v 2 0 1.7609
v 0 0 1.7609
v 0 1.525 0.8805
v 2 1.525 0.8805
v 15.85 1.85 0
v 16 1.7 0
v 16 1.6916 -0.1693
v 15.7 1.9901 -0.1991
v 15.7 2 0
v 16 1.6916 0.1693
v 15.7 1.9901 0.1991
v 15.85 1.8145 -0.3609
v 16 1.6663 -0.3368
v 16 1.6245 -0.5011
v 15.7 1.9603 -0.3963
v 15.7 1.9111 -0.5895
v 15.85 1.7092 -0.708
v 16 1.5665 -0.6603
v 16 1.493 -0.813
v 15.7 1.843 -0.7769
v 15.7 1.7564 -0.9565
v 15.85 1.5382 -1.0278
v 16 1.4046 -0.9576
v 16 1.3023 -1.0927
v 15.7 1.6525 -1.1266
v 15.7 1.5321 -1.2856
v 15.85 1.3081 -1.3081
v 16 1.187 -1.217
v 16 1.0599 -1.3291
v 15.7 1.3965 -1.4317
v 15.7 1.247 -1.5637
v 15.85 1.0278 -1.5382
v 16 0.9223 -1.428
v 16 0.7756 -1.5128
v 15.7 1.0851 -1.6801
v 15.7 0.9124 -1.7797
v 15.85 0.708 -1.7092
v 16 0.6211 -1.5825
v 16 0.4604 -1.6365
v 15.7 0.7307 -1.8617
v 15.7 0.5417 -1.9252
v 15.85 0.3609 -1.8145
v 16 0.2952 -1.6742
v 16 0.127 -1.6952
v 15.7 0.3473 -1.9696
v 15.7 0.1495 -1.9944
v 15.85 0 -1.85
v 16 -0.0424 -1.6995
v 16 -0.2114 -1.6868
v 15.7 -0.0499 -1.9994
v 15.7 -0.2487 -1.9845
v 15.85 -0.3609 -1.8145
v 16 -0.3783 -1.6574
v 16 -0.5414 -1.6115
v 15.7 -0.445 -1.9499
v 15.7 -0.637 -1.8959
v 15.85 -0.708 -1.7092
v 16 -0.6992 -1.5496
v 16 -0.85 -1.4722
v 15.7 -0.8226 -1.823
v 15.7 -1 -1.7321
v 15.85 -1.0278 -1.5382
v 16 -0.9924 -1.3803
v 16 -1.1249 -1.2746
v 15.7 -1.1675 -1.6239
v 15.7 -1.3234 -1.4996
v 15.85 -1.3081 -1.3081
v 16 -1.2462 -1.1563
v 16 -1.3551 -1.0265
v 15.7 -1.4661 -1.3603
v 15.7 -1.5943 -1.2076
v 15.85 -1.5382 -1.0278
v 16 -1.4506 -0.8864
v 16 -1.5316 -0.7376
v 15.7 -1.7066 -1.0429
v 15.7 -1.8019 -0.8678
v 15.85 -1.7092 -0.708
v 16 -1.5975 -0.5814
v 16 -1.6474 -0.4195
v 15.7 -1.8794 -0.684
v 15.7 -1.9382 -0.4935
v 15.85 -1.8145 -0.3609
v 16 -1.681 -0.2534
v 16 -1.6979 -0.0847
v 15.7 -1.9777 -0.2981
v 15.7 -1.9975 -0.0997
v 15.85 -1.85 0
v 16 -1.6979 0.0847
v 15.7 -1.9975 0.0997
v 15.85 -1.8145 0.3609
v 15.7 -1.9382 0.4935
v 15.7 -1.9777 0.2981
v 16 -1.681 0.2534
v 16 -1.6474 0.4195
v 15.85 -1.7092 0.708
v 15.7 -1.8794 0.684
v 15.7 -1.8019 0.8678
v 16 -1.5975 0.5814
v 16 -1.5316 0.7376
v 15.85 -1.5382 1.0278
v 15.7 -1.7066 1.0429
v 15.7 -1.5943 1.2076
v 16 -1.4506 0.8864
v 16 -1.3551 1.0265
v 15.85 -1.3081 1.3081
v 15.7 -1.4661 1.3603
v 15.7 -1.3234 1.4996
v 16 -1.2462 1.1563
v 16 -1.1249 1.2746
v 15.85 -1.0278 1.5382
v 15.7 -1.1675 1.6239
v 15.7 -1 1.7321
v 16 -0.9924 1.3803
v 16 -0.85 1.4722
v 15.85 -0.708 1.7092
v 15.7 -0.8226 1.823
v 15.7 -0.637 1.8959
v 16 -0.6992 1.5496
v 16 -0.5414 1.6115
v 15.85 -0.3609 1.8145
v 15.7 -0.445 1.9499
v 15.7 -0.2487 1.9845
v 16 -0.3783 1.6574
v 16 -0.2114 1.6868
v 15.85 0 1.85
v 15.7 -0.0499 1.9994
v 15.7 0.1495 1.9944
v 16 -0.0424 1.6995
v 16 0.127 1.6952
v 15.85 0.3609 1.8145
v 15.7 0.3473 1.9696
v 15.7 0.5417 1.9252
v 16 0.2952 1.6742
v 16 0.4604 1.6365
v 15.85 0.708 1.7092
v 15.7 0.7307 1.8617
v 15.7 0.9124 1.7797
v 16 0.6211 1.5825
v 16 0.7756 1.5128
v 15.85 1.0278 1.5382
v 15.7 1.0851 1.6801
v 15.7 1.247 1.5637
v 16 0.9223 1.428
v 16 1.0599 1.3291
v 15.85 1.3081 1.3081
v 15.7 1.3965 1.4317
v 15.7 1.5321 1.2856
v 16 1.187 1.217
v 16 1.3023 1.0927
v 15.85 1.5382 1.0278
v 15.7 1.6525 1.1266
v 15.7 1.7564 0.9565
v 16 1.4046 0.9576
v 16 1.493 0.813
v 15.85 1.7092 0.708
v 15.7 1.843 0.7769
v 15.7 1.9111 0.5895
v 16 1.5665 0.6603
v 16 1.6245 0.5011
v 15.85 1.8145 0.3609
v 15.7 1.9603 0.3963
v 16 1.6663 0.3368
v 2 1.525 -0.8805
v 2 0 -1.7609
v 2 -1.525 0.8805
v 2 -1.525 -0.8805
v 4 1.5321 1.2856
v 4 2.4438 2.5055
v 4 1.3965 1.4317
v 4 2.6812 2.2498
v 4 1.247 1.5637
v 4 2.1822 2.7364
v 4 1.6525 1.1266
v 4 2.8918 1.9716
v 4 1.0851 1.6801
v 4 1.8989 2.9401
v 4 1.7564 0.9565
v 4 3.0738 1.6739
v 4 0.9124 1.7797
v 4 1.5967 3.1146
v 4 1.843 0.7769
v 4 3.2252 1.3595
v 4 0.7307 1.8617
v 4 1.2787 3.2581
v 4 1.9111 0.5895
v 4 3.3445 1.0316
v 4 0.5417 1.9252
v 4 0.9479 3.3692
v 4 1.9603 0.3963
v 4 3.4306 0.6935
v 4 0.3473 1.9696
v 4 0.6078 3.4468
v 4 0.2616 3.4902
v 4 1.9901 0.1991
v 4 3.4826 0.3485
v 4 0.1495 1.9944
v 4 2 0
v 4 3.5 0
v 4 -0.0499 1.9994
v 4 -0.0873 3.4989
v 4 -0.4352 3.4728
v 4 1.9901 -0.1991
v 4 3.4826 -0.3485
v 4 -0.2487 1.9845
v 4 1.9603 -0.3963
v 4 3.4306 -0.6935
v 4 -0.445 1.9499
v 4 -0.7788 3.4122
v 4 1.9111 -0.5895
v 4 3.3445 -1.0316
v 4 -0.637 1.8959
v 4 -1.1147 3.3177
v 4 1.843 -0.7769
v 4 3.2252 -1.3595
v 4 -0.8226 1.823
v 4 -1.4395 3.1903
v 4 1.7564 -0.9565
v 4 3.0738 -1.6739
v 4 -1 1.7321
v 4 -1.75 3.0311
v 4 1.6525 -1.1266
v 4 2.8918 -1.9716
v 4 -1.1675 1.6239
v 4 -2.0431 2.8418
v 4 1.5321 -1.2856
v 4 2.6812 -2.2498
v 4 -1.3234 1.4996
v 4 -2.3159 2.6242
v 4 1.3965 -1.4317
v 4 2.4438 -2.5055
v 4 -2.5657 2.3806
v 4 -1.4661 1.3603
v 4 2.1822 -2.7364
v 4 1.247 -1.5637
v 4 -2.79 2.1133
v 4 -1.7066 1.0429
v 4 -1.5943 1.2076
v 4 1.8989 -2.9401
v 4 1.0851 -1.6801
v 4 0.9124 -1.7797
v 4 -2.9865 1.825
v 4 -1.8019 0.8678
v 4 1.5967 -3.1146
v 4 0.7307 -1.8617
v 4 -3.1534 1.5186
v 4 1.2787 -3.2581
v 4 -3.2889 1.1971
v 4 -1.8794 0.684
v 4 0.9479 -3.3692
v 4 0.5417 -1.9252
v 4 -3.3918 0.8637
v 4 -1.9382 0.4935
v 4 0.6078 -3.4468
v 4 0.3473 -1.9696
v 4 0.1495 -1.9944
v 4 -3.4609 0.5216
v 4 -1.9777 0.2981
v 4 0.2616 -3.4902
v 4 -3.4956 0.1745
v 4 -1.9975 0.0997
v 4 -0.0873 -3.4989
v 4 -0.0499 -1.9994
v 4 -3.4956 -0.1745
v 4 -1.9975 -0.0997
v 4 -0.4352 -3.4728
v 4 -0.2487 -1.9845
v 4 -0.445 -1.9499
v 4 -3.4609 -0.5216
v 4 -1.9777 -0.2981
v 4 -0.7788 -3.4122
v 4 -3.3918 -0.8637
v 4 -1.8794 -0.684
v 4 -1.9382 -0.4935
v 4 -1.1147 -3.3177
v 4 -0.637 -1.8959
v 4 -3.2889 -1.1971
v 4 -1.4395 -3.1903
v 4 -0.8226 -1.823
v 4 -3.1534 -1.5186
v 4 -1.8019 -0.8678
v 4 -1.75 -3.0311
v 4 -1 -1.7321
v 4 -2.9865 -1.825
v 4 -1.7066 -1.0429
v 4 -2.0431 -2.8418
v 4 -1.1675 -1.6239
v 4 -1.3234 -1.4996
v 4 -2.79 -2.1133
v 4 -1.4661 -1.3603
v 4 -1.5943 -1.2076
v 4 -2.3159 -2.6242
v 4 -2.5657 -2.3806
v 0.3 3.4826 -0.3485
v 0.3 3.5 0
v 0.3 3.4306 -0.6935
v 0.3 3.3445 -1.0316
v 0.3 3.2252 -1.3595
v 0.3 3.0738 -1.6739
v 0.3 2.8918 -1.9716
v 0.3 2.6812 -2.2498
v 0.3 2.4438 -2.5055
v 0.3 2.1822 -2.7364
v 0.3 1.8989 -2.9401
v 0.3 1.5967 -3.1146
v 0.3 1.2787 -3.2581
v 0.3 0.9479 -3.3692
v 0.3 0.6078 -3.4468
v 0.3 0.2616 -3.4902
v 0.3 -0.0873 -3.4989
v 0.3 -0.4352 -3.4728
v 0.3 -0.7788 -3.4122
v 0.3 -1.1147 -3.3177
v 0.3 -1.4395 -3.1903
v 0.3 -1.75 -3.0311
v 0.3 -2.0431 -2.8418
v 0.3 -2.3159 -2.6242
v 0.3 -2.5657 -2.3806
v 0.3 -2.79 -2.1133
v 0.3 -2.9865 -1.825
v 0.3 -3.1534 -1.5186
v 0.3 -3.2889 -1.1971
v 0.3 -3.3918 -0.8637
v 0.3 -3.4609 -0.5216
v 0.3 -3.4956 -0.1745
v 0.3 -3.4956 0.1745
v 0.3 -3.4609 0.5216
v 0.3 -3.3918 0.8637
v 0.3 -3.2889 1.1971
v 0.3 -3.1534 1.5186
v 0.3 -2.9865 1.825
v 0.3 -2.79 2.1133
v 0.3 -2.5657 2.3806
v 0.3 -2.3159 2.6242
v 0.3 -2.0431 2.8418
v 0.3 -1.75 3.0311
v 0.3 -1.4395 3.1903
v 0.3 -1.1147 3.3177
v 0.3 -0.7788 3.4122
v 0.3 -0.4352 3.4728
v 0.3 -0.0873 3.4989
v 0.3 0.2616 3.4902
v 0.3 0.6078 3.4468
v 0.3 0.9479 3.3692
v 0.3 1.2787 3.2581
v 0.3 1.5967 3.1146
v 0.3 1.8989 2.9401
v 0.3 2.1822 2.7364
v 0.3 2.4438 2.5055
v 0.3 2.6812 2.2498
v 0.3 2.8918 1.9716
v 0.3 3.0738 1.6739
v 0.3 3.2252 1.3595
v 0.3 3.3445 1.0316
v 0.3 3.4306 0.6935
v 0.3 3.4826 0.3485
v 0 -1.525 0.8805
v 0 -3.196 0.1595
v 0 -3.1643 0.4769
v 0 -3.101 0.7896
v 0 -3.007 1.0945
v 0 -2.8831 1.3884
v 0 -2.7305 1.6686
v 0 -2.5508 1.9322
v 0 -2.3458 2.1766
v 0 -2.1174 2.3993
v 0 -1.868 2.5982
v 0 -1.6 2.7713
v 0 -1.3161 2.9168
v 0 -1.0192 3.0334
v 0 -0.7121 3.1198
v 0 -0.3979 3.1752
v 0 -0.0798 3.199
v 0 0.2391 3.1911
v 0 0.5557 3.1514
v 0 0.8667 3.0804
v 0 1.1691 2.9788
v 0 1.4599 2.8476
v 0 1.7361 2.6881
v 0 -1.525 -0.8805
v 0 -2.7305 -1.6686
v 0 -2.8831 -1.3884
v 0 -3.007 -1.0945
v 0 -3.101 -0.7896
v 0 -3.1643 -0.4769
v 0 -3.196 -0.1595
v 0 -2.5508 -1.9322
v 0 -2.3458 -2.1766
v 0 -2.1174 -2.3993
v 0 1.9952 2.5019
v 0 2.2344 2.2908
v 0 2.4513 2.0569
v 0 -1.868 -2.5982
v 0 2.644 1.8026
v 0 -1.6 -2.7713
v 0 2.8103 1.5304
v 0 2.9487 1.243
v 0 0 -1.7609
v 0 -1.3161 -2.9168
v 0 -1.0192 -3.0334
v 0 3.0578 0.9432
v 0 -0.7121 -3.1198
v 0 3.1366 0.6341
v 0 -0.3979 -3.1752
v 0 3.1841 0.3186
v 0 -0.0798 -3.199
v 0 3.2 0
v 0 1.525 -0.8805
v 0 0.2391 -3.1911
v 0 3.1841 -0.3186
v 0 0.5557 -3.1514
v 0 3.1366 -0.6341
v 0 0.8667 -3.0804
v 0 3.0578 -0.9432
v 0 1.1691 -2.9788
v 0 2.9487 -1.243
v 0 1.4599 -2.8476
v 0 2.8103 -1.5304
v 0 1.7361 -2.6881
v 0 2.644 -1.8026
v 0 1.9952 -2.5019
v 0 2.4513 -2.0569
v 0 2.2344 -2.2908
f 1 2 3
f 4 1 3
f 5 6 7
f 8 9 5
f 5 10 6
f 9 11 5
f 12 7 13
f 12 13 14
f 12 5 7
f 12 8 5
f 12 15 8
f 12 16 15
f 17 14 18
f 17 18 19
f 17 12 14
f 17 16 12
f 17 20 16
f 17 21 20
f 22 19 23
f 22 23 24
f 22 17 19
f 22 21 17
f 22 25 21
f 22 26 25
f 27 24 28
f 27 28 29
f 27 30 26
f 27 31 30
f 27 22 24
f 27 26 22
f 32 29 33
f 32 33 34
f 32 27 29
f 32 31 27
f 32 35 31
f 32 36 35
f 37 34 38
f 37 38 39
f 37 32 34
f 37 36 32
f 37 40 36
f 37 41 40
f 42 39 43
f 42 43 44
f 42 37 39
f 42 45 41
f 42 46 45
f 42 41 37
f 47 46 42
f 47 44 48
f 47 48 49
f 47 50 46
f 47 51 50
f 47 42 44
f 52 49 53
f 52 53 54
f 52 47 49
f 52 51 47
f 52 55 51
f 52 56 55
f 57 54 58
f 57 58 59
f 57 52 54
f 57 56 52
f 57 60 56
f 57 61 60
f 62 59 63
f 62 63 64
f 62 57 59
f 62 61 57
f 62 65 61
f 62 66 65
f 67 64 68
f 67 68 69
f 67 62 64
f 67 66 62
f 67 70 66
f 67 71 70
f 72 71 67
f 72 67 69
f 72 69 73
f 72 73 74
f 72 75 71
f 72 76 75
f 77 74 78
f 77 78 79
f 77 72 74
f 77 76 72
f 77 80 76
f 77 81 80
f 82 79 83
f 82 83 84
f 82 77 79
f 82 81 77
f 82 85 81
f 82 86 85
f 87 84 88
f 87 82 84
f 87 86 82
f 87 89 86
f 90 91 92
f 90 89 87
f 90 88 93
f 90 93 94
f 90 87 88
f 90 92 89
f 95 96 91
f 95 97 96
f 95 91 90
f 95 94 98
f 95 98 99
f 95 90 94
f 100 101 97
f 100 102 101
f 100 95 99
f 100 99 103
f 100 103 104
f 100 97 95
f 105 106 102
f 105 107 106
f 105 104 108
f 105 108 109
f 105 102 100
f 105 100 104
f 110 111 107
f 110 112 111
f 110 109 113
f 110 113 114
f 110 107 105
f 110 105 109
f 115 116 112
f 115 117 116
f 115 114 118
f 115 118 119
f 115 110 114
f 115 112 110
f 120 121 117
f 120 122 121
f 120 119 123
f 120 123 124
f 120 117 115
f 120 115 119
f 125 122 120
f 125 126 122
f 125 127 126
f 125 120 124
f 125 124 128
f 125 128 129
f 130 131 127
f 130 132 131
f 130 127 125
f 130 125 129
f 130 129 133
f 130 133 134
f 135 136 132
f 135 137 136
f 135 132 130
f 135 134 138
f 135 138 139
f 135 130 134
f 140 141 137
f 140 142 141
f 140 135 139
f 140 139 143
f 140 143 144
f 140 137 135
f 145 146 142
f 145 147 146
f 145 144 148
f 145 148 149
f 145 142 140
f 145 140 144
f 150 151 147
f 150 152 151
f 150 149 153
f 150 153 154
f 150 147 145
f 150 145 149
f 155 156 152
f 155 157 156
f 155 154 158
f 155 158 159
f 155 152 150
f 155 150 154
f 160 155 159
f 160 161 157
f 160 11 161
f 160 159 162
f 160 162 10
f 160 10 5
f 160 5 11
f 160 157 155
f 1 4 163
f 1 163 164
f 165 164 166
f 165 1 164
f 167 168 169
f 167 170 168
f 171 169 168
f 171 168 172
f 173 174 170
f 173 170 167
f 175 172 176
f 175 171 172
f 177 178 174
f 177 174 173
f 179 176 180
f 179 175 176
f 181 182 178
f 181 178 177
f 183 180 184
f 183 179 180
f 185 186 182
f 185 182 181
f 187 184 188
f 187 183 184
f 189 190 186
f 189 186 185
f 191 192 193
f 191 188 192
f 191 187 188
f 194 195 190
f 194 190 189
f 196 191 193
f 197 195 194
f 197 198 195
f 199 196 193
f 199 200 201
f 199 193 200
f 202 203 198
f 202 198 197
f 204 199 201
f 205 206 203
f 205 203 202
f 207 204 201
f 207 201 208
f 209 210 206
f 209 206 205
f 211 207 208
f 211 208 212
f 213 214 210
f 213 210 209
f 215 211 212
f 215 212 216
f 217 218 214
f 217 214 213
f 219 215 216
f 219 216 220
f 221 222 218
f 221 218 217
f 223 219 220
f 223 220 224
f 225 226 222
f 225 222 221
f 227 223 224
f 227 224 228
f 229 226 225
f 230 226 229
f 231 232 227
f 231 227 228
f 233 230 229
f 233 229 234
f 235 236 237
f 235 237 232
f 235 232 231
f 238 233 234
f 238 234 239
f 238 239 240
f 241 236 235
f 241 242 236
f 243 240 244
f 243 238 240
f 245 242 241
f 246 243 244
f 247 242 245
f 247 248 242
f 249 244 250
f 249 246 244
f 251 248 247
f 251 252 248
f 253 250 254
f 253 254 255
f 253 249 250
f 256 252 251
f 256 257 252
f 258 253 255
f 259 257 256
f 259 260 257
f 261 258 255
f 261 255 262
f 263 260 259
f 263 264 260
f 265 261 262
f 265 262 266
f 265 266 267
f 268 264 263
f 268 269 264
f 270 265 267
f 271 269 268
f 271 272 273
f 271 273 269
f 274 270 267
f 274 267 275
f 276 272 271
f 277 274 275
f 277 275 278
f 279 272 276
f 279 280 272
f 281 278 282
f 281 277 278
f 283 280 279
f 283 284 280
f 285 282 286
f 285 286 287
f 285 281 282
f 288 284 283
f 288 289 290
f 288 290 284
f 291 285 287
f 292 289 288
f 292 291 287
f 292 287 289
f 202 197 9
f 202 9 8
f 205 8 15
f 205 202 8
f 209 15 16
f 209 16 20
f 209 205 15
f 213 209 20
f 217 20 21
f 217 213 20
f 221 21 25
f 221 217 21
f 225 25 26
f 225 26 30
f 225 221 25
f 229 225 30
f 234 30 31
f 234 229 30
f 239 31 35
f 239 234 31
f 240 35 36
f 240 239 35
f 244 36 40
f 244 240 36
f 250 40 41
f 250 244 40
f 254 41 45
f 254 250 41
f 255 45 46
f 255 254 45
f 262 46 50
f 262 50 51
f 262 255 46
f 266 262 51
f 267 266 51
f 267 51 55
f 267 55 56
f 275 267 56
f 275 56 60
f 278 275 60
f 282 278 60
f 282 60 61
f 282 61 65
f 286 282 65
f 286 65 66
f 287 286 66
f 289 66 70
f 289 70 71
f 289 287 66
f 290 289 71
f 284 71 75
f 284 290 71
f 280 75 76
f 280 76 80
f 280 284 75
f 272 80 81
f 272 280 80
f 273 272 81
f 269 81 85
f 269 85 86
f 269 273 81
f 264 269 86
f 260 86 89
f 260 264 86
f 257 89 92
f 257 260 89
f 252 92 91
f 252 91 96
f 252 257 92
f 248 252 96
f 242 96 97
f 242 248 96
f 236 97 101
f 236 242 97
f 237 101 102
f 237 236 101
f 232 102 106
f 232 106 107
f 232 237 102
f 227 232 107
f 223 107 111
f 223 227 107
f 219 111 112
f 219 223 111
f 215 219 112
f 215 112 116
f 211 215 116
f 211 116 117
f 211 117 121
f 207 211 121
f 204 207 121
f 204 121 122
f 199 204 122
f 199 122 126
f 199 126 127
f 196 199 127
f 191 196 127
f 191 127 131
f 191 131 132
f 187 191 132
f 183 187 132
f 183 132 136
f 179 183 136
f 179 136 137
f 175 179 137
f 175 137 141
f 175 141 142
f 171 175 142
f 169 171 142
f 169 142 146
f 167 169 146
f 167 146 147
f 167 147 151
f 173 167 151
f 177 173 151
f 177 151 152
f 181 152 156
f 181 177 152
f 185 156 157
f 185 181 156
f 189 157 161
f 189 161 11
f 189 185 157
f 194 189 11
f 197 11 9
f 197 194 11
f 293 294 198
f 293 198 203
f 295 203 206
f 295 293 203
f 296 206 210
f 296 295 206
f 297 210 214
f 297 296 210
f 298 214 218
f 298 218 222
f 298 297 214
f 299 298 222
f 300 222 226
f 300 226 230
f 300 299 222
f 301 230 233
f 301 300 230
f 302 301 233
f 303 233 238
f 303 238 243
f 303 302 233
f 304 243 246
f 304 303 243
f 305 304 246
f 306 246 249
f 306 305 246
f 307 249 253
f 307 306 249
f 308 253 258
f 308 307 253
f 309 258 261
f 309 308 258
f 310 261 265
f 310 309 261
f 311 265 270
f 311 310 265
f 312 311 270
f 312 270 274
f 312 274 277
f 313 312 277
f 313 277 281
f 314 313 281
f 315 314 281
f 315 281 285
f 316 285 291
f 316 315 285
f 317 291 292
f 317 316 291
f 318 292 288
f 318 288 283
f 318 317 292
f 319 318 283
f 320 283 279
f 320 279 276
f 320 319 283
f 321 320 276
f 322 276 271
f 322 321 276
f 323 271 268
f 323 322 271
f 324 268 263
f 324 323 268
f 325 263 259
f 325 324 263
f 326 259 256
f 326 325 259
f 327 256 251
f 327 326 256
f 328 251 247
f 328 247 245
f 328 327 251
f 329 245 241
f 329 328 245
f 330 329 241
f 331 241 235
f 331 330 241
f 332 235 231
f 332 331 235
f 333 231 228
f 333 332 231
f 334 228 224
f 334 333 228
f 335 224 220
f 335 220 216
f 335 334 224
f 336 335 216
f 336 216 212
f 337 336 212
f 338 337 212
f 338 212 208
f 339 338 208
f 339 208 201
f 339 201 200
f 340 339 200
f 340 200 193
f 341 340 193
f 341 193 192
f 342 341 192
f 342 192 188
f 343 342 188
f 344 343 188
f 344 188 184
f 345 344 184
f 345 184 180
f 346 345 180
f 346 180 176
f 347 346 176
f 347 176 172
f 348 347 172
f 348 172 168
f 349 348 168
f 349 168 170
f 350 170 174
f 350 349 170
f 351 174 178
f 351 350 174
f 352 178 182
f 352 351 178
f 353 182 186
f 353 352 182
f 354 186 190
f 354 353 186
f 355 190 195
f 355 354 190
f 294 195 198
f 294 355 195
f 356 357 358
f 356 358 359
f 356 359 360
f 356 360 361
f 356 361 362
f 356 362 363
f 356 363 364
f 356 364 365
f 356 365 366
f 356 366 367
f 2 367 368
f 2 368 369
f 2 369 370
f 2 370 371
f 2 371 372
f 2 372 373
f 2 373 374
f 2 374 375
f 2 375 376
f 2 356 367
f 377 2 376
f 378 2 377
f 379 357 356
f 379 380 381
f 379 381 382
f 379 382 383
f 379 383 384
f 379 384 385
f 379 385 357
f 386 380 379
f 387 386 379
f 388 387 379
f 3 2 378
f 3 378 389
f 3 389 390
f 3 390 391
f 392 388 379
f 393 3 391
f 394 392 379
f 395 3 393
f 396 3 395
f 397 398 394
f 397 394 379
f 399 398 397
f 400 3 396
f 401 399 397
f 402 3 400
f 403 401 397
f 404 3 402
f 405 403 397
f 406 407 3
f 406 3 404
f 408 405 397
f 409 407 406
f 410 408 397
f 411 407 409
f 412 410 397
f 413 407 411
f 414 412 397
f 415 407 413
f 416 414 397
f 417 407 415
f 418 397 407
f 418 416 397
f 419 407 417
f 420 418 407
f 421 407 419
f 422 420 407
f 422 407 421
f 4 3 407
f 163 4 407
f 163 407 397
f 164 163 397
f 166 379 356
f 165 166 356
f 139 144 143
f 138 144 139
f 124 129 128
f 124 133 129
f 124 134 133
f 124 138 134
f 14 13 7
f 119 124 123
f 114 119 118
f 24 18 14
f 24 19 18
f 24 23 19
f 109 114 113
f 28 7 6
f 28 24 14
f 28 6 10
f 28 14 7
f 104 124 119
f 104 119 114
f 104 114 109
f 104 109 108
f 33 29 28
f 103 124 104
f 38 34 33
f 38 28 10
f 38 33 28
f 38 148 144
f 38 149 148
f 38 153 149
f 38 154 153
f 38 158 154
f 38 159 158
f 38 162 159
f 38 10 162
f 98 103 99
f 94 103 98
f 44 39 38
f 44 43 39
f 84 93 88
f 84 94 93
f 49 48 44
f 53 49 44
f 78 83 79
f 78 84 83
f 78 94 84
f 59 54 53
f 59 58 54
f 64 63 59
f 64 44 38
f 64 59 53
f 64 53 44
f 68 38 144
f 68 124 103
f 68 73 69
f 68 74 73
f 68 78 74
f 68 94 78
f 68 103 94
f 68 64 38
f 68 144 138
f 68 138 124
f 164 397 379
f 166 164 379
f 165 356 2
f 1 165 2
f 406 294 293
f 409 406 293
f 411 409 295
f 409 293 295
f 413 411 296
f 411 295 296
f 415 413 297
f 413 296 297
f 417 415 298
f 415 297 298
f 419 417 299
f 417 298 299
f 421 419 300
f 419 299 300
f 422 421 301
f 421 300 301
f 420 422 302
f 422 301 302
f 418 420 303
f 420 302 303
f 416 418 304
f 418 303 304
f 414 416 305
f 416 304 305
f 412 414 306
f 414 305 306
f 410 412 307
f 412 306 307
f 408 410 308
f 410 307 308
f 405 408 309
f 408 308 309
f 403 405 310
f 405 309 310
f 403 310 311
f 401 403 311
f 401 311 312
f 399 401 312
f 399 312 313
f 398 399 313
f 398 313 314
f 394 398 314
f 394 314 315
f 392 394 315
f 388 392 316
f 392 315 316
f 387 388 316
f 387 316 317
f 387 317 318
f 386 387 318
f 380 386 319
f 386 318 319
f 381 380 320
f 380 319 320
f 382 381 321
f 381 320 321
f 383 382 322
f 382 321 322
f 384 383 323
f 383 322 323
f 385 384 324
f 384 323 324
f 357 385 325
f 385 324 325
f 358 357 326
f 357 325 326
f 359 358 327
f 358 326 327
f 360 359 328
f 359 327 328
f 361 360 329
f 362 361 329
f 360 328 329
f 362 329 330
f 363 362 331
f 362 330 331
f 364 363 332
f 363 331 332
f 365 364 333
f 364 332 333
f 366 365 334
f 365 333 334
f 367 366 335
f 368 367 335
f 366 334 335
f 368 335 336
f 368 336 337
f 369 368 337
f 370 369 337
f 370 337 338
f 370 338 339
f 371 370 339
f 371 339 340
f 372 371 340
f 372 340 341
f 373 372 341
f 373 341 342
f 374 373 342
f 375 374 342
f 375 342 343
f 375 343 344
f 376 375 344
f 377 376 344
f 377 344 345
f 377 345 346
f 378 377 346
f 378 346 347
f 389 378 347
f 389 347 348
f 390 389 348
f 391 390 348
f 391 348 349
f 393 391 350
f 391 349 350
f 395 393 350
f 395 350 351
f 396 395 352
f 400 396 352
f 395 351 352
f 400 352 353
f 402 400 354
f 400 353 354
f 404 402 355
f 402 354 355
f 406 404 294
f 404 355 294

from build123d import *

# Parameters (mm, degrees)
F2_SIZE  = 0.3
F4_DEPTH = 2


with BuildPart() as f1:
    # F0 (on Top) → F1 (revolve)
    with BuildSketch(Plane.XY):
        Polygon((0, 3.5), (0, 0), (16, 0), (16, 2), (4, 2), (4, 3.5), align=None)
    revolve(axis=Axis((8, 0, 0), (-1, 0, 0)))

    # F2
    f2_edges = [f1.edges().sort_by_distance(p)[0] for p in [
        (0, -3.5, 0),
        (16, -2, 0),
    ]]
    chamfer(f2_edges, length=F2_SIZE)

    # F3 (on face) → F4 (cut)
    with BuildSketch(Plane(origin=(0, 0, 0), x_dir=(0, -1, 0), z_dir=(-1, 0, 0))):
        Polygon((1.525, 0.880459), (0, 1.760918), (-1.525, 0.880459), (-1.525, -0.880459), (0, -1.760918), (1.525, -0.880459), align=None)
    extrude(amount=-F4_DEPTH, mode=Mode.SUBTRACT)


solid = f1.part
